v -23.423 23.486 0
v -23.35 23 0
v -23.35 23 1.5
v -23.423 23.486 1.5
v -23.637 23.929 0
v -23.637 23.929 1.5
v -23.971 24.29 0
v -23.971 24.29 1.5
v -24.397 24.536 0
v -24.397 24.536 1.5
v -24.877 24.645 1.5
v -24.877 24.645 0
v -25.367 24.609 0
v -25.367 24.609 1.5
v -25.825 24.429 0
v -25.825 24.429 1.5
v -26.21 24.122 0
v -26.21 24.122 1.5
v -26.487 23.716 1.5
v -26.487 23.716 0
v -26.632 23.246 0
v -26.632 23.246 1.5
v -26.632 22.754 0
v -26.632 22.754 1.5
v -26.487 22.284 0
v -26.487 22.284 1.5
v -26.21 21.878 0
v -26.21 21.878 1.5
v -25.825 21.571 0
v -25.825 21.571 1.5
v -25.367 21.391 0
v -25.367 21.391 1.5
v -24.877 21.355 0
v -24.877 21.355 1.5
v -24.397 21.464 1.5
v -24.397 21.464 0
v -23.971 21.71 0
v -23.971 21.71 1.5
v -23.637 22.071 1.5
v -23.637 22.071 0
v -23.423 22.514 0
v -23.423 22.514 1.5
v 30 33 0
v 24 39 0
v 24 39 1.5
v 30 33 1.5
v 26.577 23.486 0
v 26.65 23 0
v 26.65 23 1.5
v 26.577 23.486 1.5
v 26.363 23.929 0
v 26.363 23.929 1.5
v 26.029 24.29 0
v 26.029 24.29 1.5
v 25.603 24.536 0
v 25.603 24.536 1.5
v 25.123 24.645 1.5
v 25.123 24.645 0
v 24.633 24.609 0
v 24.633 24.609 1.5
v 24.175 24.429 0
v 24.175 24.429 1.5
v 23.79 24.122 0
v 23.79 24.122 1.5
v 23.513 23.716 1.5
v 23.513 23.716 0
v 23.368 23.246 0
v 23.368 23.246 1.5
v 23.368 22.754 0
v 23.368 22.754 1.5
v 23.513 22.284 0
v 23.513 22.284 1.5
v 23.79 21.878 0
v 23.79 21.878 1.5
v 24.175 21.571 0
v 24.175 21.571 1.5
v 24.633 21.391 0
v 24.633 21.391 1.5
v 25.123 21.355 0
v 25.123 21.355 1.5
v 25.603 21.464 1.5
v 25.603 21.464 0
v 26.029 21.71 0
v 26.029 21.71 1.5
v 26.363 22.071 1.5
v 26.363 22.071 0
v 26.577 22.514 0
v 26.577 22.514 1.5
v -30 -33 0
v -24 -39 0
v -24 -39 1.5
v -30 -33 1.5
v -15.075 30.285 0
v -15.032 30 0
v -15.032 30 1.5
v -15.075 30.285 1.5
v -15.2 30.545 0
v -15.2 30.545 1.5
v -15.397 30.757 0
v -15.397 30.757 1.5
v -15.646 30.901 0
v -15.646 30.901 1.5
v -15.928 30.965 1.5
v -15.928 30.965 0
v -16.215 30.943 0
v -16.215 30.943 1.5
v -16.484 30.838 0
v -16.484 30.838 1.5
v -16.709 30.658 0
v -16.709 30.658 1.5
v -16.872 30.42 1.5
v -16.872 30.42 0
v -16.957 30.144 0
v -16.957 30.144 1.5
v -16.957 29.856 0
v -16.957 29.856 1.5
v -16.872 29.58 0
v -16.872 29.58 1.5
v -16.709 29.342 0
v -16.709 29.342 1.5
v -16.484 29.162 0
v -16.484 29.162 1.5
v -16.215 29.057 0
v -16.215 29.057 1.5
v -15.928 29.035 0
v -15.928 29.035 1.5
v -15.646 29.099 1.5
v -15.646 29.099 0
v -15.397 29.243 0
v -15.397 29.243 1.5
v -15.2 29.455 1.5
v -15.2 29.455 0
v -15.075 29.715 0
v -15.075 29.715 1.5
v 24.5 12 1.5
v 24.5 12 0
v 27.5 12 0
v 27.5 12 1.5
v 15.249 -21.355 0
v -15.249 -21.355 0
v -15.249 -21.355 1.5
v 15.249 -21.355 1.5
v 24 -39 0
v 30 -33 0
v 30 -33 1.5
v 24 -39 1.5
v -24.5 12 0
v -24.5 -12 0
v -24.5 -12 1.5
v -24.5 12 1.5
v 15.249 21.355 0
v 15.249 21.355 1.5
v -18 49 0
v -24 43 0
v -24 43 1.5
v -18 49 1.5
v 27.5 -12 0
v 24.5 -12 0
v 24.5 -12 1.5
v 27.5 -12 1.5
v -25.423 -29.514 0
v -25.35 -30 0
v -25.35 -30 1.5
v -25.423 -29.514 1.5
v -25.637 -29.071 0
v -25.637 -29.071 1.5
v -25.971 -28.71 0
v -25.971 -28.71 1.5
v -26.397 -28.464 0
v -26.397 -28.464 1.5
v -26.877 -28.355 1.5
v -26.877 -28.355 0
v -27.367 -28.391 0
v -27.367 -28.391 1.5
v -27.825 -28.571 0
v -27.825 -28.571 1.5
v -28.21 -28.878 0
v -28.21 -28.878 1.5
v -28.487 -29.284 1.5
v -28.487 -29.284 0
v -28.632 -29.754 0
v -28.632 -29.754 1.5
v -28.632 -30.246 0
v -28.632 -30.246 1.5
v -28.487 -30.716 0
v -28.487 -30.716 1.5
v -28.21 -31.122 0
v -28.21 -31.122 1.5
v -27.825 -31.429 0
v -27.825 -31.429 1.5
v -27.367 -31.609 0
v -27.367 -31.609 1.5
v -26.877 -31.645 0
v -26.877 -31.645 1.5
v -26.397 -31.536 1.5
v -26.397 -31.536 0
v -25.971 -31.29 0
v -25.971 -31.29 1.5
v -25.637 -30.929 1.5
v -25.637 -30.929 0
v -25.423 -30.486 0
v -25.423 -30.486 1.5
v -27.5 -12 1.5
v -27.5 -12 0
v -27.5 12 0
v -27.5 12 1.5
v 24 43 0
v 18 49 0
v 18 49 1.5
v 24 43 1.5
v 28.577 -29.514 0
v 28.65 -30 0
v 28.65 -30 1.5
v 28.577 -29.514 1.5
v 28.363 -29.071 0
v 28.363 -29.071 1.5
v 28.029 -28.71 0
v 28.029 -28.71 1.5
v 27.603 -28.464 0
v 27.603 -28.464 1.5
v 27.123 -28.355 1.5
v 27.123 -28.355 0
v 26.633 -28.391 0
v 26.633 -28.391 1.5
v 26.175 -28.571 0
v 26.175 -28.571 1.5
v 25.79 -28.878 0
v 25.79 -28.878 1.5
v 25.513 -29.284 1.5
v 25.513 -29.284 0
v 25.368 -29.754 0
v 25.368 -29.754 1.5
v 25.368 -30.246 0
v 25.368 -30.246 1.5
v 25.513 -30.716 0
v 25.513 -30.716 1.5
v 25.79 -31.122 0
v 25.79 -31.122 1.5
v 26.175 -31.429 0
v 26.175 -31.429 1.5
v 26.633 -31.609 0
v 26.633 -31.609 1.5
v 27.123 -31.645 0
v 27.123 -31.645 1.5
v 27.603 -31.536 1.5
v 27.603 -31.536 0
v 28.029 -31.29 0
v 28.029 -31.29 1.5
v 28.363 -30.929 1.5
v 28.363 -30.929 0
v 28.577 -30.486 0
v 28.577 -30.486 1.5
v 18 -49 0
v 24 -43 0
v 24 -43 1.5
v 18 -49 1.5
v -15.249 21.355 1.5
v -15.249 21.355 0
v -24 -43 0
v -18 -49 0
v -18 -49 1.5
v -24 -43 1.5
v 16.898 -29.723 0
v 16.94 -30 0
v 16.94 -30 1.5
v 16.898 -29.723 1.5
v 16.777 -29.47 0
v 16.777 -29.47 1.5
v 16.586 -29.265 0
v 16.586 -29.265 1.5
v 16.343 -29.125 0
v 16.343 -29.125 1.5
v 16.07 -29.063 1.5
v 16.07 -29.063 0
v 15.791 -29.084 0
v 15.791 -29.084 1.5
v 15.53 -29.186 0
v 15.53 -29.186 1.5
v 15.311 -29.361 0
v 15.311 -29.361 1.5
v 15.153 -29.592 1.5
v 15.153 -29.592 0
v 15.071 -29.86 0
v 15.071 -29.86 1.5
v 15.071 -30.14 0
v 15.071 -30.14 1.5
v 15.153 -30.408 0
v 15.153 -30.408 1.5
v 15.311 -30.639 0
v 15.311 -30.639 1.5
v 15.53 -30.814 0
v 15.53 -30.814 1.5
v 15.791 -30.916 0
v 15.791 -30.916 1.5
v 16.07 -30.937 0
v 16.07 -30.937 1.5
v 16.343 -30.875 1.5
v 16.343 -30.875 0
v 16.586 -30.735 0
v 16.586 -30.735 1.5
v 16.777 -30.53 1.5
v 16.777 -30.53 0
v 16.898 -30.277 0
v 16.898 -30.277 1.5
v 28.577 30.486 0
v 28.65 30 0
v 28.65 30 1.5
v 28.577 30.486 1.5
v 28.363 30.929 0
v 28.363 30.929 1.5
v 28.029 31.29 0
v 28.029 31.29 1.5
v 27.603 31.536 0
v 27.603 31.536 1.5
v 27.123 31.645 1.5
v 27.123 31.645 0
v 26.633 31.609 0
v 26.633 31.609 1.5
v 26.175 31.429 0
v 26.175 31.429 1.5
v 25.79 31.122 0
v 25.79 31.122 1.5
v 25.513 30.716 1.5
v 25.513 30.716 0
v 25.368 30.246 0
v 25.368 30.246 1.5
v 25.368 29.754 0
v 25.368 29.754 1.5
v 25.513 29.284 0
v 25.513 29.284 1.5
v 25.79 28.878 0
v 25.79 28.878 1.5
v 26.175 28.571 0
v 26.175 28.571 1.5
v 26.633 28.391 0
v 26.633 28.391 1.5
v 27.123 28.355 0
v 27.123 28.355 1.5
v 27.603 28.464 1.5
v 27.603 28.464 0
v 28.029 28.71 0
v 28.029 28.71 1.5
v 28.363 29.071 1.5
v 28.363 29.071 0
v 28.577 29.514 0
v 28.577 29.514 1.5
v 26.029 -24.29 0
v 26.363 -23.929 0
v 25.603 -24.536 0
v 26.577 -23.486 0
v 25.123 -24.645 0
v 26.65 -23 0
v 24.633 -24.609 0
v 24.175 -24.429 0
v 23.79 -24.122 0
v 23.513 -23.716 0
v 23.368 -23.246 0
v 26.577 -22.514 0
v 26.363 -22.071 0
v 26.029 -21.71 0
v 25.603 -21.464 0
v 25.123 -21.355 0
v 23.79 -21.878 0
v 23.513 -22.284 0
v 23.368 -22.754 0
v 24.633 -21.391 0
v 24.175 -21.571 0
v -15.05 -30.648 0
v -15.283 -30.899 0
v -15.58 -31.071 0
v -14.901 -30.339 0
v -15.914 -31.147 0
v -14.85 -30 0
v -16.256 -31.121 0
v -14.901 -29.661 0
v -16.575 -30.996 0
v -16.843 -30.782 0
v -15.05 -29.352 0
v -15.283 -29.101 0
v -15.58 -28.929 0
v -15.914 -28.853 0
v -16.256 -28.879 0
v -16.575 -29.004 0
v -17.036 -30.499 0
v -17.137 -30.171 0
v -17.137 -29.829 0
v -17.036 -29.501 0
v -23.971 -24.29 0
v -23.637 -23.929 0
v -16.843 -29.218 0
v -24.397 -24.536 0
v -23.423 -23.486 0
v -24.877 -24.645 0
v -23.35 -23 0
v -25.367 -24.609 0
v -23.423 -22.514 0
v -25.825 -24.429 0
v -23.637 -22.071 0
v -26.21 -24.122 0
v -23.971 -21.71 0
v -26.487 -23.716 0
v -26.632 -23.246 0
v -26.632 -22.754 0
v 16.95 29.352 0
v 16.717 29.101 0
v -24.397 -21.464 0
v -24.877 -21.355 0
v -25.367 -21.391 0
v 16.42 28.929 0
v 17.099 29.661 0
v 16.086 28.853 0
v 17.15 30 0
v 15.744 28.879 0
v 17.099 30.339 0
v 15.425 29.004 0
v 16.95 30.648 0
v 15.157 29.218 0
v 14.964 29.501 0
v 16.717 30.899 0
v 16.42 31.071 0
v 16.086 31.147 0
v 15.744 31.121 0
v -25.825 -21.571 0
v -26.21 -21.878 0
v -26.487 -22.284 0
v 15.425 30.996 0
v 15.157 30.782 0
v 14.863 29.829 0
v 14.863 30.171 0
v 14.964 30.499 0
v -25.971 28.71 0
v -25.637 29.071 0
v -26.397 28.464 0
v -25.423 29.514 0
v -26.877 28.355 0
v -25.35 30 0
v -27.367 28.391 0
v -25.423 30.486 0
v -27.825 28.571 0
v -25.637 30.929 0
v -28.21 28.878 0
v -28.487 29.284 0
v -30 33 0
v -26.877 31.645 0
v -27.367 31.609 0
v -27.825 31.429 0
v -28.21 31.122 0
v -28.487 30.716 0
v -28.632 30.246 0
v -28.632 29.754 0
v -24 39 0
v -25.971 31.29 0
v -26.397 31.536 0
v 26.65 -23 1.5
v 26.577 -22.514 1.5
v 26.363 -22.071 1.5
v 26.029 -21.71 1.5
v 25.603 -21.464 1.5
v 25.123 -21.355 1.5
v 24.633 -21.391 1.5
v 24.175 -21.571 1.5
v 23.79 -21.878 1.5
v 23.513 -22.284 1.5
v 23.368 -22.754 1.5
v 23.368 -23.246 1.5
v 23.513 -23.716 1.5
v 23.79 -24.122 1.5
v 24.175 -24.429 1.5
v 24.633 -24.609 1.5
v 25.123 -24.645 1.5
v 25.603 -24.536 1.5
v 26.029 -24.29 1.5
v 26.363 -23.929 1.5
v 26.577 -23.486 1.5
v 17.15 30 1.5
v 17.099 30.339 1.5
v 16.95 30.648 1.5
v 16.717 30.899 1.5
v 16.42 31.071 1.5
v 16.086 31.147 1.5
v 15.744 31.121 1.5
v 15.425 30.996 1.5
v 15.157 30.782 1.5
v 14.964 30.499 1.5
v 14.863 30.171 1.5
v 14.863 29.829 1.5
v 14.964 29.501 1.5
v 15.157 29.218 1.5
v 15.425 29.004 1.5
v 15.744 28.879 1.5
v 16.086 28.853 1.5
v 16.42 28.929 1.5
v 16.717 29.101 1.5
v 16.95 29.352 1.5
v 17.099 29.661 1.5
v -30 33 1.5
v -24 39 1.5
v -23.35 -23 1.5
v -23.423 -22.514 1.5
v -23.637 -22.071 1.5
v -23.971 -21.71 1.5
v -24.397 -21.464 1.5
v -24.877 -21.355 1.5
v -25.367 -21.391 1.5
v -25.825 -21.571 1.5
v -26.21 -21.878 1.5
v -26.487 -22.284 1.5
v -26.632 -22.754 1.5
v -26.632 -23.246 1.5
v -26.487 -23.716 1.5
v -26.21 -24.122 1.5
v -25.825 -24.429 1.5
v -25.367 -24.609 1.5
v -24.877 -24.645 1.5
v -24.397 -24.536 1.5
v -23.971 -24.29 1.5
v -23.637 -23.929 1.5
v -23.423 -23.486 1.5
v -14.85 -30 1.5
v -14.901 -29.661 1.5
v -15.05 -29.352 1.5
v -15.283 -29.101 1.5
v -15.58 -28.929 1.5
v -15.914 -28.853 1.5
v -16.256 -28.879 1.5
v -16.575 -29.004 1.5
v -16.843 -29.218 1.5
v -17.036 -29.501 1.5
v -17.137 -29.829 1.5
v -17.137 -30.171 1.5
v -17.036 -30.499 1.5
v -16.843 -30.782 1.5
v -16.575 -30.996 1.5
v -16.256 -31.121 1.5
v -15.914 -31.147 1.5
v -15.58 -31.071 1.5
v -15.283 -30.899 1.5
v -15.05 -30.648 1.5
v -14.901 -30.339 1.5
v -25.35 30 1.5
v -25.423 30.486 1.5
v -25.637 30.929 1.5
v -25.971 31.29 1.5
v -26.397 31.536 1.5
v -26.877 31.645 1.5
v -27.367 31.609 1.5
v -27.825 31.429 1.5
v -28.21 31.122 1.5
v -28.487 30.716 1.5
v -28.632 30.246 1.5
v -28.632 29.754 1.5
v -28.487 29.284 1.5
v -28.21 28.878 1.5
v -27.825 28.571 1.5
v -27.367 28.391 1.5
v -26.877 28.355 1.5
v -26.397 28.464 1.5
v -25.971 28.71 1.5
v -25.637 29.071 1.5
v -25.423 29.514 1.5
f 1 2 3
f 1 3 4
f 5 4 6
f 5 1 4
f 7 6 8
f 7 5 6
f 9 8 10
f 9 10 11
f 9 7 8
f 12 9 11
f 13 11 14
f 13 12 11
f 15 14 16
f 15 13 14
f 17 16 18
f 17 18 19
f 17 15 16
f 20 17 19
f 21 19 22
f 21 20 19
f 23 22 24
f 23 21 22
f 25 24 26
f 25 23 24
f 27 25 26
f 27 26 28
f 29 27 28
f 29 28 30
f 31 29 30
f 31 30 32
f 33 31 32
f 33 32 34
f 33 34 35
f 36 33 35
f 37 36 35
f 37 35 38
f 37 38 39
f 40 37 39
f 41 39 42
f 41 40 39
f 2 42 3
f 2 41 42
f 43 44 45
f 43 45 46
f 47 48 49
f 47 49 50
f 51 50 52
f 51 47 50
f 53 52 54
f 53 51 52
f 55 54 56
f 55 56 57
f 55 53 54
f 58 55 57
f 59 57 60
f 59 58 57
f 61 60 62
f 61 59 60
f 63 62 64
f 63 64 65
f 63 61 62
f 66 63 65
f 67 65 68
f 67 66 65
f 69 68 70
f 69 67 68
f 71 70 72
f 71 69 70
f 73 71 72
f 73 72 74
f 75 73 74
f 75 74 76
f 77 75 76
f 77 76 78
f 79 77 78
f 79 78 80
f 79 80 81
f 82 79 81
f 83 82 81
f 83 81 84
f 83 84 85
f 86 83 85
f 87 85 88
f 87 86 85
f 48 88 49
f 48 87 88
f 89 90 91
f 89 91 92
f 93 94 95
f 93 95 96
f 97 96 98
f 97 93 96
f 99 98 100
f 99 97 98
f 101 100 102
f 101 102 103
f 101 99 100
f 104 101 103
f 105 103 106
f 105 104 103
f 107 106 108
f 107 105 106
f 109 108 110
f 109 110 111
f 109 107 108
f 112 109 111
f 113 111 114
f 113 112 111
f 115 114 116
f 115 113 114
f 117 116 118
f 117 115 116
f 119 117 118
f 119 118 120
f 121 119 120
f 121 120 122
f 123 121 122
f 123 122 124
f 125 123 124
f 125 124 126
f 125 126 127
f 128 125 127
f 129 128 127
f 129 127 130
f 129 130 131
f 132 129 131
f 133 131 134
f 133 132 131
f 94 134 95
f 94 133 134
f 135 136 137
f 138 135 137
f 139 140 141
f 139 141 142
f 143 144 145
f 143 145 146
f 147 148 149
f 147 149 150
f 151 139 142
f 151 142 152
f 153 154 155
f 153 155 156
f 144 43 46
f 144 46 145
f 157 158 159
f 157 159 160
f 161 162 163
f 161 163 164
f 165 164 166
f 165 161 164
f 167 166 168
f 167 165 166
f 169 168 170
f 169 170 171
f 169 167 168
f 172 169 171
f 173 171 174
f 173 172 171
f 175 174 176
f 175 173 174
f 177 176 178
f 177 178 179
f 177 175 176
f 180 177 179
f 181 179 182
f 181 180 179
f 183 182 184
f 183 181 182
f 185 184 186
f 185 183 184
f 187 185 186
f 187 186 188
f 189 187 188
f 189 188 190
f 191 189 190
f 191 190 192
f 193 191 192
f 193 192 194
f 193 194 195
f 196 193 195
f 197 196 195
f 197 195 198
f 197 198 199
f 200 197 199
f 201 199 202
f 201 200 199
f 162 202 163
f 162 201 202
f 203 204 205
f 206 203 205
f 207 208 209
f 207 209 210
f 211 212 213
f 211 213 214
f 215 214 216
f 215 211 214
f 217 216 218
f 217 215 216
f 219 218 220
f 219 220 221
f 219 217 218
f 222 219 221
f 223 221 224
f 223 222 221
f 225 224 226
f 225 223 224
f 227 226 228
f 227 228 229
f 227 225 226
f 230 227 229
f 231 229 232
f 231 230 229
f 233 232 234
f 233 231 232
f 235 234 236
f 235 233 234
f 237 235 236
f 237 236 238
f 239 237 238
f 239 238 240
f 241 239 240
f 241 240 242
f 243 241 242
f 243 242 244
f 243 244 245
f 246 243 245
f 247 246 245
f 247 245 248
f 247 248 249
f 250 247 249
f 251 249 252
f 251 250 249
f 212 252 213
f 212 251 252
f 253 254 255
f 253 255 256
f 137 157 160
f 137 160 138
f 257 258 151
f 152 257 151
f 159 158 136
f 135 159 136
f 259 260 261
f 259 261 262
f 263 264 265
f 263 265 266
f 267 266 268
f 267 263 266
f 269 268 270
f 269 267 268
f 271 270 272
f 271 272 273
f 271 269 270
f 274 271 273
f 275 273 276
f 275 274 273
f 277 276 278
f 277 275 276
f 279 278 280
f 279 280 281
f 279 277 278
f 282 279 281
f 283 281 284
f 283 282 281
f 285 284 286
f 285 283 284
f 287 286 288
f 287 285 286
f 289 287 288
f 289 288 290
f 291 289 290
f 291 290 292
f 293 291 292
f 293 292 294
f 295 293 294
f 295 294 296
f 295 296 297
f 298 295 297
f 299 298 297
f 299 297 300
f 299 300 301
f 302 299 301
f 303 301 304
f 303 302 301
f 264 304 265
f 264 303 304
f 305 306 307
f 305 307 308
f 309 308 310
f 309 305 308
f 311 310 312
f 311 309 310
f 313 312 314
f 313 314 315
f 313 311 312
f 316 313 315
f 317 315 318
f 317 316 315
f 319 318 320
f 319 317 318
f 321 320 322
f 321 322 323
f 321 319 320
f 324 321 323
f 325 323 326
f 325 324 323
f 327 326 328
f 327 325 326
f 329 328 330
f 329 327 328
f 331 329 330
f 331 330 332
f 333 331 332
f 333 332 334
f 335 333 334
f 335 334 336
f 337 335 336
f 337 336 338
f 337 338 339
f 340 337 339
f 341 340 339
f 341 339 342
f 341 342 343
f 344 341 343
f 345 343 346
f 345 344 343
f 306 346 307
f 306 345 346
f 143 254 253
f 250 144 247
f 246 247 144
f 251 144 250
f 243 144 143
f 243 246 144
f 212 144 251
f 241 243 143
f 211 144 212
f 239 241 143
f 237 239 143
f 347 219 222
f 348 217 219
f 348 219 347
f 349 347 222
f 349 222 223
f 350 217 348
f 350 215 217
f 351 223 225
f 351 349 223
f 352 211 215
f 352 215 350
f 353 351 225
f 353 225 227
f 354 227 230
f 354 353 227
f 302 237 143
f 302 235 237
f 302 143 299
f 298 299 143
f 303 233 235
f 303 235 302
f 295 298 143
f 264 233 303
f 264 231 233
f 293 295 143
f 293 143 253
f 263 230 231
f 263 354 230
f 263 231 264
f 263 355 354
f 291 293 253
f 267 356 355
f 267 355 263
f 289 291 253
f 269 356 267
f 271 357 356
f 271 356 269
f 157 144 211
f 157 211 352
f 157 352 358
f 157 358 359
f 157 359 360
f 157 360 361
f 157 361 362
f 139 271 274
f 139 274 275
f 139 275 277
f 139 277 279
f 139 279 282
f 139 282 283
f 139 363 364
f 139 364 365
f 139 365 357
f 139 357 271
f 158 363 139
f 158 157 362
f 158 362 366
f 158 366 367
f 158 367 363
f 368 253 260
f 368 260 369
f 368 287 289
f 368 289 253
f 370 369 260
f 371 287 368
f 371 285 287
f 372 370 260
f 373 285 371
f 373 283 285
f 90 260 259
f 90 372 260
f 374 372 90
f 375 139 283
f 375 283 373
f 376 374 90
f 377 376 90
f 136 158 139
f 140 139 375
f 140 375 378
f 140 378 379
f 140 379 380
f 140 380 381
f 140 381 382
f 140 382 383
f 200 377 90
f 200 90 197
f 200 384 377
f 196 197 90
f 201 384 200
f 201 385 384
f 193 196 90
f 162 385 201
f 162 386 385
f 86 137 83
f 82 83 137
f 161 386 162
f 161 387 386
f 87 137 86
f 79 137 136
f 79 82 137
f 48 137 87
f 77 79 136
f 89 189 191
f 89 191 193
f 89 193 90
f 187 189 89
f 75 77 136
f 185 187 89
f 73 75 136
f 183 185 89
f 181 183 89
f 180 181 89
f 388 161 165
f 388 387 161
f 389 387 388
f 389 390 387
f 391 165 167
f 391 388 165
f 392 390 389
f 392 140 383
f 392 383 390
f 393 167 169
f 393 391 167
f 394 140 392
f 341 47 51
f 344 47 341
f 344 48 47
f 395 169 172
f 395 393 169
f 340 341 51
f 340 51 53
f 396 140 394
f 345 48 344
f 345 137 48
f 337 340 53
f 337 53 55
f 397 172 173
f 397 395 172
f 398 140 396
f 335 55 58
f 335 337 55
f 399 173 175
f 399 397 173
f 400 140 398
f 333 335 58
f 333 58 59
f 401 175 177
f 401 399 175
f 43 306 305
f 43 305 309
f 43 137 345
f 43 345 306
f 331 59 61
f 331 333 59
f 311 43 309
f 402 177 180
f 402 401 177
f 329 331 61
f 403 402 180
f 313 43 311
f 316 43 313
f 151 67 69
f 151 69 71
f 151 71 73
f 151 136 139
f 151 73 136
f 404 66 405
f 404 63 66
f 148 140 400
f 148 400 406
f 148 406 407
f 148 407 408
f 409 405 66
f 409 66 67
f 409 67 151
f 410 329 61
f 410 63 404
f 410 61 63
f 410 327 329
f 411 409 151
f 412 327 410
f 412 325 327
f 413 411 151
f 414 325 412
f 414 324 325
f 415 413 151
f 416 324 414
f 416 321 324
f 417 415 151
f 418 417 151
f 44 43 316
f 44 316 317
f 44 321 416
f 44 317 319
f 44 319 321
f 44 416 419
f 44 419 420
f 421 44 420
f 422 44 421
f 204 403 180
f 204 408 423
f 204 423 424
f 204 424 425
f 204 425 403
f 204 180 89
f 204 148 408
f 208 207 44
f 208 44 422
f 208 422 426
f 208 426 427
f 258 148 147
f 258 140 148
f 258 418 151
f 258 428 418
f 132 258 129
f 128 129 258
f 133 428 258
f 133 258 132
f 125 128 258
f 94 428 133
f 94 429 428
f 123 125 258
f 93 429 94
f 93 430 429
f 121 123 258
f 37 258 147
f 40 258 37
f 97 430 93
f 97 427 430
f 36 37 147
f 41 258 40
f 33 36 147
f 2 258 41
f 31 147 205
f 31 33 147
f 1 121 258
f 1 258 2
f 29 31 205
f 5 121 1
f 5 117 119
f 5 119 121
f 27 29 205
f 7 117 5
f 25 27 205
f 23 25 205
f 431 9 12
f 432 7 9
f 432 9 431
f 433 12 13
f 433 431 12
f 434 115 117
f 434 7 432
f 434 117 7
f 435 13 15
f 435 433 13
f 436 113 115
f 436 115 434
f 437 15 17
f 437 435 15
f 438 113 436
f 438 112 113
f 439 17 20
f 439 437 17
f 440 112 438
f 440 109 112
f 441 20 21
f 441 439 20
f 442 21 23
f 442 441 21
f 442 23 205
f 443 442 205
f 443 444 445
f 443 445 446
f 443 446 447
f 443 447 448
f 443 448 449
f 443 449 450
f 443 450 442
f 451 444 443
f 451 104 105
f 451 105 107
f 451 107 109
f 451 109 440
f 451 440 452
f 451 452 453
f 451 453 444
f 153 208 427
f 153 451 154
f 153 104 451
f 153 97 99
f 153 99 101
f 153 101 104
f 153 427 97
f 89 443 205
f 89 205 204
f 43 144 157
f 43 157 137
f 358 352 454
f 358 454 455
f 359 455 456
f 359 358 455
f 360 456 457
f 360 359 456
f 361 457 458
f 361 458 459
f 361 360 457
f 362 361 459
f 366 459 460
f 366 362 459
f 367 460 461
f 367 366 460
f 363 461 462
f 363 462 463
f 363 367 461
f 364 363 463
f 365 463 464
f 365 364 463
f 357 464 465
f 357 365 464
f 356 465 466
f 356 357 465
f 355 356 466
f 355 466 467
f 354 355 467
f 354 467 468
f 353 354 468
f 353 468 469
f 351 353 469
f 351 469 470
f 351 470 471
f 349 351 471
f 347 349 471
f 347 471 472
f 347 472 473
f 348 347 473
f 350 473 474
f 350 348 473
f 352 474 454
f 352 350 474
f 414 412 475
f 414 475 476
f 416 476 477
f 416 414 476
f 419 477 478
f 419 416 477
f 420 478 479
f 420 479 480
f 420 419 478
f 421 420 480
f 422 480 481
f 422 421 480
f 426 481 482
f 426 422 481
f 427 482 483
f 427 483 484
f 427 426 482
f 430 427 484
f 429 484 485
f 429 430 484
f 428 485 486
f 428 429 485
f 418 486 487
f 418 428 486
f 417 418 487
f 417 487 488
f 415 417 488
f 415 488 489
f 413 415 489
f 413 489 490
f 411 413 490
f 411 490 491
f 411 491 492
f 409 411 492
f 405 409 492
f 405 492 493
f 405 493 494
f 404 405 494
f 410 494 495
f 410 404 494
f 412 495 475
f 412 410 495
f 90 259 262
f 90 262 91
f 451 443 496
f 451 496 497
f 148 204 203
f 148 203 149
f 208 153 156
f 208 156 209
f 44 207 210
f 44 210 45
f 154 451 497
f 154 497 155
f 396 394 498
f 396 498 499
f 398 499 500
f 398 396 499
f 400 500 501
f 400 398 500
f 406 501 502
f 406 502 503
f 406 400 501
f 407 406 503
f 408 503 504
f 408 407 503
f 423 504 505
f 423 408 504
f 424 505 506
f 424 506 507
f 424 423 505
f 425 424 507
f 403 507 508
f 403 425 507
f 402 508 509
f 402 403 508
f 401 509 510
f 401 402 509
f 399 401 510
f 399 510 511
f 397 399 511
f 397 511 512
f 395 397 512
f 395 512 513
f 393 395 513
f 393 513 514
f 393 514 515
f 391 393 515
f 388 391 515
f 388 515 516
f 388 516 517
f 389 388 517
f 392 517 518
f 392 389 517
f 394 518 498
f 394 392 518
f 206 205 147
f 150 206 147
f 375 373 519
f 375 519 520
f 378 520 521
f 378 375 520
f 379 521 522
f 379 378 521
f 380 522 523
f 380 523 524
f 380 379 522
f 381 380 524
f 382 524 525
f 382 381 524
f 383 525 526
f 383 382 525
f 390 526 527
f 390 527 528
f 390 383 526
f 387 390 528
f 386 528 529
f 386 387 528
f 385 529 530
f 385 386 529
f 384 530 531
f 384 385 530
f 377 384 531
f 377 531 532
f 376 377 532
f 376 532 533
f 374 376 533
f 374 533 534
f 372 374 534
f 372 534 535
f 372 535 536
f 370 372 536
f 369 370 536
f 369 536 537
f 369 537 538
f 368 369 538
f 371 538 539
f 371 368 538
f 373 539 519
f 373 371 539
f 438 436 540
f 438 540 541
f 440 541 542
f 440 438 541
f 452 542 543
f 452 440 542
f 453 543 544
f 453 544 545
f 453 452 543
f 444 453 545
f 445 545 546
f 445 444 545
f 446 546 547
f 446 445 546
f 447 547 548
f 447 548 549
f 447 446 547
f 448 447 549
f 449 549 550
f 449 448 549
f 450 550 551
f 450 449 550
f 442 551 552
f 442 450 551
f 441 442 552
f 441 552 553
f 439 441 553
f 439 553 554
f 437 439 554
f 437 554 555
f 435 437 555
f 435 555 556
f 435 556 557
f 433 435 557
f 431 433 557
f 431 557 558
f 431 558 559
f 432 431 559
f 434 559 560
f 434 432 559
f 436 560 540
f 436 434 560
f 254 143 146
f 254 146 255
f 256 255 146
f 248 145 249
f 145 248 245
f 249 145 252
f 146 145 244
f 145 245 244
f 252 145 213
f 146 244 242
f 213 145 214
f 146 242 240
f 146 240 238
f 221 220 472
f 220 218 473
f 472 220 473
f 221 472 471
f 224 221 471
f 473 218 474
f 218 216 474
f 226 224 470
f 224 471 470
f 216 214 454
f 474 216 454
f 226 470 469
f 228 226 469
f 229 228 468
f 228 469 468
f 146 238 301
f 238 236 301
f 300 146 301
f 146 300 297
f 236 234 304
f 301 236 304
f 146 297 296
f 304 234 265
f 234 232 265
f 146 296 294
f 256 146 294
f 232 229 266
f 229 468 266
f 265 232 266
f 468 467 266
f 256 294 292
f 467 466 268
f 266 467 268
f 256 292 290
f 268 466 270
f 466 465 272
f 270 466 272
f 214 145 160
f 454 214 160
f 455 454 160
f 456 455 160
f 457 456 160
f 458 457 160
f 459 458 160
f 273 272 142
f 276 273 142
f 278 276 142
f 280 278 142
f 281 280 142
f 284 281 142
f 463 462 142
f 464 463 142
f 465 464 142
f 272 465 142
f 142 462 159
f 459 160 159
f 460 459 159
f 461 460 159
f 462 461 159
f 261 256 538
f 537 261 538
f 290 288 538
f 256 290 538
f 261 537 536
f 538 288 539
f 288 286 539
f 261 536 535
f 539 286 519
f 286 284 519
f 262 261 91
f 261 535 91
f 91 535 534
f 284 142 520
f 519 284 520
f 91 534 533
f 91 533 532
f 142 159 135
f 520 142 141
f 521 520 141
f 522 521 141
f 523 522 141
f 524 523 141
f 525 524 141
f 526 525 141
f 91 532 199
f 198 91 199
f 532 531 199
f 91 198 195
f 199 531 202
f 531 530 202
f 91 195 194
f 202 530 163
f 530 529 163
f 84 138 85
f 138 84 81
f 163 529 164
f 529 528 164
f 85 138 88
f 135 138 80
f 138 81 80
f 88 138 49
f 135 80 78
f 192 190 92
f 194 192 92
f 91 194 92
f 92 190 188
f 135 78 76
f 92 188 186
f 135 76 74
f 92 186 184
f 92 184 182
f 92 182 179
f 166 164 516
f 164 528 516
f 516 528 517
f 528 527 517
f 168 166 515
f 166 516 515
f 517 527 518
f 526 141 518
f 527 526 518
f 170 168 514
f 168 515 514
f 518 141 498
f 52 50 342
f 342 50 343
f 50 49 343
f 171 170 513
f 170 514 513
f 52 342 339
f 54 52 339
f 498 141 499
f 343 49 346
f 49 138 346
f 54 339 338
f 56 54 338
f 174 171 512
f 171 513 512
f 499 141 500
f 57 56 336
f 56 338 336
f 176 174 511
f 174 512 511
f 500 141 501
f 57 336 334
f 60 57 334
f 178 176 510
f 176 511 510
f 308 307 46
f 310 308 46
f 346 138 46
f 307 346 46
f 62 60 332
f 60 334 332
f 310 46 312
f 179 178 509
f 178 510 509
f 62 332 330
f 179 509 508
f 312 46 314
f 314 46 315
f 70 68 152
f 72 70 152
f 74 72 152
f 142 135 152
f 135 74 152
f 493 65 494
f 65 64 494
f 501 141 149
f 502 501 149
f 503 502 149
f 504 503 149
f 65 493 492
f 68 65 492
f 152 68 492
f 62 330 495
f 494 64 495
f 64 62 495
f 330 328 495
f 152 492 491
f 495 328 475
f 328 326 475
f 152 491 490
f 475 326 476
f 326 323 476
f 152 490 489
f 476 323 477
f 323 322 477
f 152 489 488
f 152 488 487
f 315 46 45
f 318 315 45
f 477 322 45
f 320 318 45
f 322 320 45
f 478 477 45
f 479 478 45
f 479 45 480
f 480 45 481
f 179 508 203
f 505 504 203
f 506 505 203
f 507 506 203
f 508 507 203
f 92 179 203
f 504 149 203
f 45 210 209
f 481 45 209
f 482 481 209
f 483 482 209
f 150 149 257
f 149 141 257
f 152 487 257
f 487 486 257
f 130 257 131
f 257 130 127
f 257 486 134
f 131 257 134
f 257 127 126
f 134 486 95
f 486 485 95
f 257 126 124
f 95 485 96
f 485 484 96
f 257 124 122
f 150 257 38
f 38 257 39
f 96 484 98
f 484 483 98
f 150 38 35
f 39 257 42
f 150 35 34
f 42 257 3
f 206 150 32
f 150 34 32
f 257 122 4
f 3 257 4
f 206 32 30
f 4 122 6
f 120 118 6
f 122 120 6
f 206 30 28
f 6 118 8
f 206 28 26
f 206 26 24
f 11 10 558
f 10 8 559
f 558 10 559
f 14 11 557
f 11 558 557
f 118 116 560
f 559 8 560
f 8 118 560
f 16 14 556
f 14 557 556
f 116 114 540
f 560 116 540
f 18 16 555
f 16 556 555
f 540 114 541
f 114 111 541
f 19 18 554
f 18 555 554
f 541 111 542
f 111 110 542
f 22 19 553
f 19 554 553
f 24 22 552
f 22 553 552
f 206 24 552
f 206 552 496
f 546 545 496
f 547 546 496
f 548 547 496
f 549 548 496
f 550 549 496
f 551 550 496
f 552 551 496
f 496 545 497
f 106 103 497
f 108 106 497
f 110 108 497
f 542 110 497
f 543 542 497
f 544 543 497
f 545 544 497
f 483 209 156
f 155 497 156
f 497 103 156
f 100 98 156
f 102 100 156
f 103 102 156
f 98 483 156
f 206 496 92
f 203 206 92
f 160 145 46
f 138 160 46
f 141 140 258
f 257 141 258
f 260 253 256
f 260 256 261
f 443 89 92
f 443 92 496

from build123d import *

# Parameters (mm, degrees)
SKETCH_1_R            = 1.15
SKETCH_1_R_2          = 0.939967297
SKETCH_1_R_3          = 0.967686678
SKETCH_1_R_4          = 1.65
SKETCH_1_W            = 30.4982
SKETCH_1_H            = 42.7098
SKETCH_1_W_2          = 3
SKETCH_1_H_2          = 24
PIXHAWK_M3_DEPTH      = 1.5
SKETCH_2_R            = 1.65
CUT_EXTRUDE_515_DEPTH = 1.5


with BuildPart() as part:
    # 草图1 → Pixhawk正装减振托板_绑带槽_四M3孔 (new body)
    with BuildSketch(Plane.XY):
        Polygon((24, -39), (24, -43), (18, -49), (-18, -49), (-24, -43), (-24, -39), (-30, -33), (-30, 33), (-24, 39), (-24, 43), (-18, 49), (18, 49), (24, 43), (24, 39), (30, 33), (30, -33), align=None)
        with Locations((16, 30)):
            Circle(SKETCH_1_R, mode=Mode.SUBTRACT)
        with Locations((-16, -30)):
            Circle(SKETCH_1_R, mode=Mode.SUBTRACT)
        with Locations((16, -30)):
            Circle(SKETCH_1_R_2, mode=Mode.SUBTRACT)
        with Locations((-16, 30)):
            Circle(SKETCH_1_R_3, mode=Mode.SUBTRACT)
        with Locations((-27, -30)):
            Circle(SKETCH_1_R_4, mode=Mode.SUBTRACT)
        with Locations((-27, 30)):
            Circle(SKETCH_1_R_4, mode=Mode.SUBTRACT)
        with Locations((27, -30)):
            Circle(SKETCH_1_R_4, mode=Mode.SUBTRACT)
        with Locations((27, 30)):
            Circle(SKETCH_1_R_4, mode=Mode.SUBTRACT)
        Rectangle(SKETCH_1_W, SKETCH_1_H, mode=Mode.SUBTRACT)
        with Locations((-26, 0)):
            Rectangle(SKETCH_1_W_2, SKETCH_1_H_2, mode=Mode.SUBTRACT)
        with Locations((26, 0)):
            Rectangle(SKETCH_1_W_2, SKETCH_1_H_2, mode=Mode.SUBTRACT)
    extrude(amount=PIXHAWK_M3_DEPTH)

    # 草图2 → Cut-Extrude 515 (cut)
    with BuildSketch(Plane.XY):
        with Locations((-25, -23)):
            Circle(SKETCH_2_R)
        with Locations((-25, 23)):
            Circle(SKETCH_2_R)
        with Locations((25, -23)):
            Circle(SKETCH_2_R)
        with Locations((25, 23)):
            Circle(SKETCH_2_R)
    extrude(amount=CUT_EXTRUDE_515_DEPTH, mode=Mode.SUBTRACT)


solid = part.part
